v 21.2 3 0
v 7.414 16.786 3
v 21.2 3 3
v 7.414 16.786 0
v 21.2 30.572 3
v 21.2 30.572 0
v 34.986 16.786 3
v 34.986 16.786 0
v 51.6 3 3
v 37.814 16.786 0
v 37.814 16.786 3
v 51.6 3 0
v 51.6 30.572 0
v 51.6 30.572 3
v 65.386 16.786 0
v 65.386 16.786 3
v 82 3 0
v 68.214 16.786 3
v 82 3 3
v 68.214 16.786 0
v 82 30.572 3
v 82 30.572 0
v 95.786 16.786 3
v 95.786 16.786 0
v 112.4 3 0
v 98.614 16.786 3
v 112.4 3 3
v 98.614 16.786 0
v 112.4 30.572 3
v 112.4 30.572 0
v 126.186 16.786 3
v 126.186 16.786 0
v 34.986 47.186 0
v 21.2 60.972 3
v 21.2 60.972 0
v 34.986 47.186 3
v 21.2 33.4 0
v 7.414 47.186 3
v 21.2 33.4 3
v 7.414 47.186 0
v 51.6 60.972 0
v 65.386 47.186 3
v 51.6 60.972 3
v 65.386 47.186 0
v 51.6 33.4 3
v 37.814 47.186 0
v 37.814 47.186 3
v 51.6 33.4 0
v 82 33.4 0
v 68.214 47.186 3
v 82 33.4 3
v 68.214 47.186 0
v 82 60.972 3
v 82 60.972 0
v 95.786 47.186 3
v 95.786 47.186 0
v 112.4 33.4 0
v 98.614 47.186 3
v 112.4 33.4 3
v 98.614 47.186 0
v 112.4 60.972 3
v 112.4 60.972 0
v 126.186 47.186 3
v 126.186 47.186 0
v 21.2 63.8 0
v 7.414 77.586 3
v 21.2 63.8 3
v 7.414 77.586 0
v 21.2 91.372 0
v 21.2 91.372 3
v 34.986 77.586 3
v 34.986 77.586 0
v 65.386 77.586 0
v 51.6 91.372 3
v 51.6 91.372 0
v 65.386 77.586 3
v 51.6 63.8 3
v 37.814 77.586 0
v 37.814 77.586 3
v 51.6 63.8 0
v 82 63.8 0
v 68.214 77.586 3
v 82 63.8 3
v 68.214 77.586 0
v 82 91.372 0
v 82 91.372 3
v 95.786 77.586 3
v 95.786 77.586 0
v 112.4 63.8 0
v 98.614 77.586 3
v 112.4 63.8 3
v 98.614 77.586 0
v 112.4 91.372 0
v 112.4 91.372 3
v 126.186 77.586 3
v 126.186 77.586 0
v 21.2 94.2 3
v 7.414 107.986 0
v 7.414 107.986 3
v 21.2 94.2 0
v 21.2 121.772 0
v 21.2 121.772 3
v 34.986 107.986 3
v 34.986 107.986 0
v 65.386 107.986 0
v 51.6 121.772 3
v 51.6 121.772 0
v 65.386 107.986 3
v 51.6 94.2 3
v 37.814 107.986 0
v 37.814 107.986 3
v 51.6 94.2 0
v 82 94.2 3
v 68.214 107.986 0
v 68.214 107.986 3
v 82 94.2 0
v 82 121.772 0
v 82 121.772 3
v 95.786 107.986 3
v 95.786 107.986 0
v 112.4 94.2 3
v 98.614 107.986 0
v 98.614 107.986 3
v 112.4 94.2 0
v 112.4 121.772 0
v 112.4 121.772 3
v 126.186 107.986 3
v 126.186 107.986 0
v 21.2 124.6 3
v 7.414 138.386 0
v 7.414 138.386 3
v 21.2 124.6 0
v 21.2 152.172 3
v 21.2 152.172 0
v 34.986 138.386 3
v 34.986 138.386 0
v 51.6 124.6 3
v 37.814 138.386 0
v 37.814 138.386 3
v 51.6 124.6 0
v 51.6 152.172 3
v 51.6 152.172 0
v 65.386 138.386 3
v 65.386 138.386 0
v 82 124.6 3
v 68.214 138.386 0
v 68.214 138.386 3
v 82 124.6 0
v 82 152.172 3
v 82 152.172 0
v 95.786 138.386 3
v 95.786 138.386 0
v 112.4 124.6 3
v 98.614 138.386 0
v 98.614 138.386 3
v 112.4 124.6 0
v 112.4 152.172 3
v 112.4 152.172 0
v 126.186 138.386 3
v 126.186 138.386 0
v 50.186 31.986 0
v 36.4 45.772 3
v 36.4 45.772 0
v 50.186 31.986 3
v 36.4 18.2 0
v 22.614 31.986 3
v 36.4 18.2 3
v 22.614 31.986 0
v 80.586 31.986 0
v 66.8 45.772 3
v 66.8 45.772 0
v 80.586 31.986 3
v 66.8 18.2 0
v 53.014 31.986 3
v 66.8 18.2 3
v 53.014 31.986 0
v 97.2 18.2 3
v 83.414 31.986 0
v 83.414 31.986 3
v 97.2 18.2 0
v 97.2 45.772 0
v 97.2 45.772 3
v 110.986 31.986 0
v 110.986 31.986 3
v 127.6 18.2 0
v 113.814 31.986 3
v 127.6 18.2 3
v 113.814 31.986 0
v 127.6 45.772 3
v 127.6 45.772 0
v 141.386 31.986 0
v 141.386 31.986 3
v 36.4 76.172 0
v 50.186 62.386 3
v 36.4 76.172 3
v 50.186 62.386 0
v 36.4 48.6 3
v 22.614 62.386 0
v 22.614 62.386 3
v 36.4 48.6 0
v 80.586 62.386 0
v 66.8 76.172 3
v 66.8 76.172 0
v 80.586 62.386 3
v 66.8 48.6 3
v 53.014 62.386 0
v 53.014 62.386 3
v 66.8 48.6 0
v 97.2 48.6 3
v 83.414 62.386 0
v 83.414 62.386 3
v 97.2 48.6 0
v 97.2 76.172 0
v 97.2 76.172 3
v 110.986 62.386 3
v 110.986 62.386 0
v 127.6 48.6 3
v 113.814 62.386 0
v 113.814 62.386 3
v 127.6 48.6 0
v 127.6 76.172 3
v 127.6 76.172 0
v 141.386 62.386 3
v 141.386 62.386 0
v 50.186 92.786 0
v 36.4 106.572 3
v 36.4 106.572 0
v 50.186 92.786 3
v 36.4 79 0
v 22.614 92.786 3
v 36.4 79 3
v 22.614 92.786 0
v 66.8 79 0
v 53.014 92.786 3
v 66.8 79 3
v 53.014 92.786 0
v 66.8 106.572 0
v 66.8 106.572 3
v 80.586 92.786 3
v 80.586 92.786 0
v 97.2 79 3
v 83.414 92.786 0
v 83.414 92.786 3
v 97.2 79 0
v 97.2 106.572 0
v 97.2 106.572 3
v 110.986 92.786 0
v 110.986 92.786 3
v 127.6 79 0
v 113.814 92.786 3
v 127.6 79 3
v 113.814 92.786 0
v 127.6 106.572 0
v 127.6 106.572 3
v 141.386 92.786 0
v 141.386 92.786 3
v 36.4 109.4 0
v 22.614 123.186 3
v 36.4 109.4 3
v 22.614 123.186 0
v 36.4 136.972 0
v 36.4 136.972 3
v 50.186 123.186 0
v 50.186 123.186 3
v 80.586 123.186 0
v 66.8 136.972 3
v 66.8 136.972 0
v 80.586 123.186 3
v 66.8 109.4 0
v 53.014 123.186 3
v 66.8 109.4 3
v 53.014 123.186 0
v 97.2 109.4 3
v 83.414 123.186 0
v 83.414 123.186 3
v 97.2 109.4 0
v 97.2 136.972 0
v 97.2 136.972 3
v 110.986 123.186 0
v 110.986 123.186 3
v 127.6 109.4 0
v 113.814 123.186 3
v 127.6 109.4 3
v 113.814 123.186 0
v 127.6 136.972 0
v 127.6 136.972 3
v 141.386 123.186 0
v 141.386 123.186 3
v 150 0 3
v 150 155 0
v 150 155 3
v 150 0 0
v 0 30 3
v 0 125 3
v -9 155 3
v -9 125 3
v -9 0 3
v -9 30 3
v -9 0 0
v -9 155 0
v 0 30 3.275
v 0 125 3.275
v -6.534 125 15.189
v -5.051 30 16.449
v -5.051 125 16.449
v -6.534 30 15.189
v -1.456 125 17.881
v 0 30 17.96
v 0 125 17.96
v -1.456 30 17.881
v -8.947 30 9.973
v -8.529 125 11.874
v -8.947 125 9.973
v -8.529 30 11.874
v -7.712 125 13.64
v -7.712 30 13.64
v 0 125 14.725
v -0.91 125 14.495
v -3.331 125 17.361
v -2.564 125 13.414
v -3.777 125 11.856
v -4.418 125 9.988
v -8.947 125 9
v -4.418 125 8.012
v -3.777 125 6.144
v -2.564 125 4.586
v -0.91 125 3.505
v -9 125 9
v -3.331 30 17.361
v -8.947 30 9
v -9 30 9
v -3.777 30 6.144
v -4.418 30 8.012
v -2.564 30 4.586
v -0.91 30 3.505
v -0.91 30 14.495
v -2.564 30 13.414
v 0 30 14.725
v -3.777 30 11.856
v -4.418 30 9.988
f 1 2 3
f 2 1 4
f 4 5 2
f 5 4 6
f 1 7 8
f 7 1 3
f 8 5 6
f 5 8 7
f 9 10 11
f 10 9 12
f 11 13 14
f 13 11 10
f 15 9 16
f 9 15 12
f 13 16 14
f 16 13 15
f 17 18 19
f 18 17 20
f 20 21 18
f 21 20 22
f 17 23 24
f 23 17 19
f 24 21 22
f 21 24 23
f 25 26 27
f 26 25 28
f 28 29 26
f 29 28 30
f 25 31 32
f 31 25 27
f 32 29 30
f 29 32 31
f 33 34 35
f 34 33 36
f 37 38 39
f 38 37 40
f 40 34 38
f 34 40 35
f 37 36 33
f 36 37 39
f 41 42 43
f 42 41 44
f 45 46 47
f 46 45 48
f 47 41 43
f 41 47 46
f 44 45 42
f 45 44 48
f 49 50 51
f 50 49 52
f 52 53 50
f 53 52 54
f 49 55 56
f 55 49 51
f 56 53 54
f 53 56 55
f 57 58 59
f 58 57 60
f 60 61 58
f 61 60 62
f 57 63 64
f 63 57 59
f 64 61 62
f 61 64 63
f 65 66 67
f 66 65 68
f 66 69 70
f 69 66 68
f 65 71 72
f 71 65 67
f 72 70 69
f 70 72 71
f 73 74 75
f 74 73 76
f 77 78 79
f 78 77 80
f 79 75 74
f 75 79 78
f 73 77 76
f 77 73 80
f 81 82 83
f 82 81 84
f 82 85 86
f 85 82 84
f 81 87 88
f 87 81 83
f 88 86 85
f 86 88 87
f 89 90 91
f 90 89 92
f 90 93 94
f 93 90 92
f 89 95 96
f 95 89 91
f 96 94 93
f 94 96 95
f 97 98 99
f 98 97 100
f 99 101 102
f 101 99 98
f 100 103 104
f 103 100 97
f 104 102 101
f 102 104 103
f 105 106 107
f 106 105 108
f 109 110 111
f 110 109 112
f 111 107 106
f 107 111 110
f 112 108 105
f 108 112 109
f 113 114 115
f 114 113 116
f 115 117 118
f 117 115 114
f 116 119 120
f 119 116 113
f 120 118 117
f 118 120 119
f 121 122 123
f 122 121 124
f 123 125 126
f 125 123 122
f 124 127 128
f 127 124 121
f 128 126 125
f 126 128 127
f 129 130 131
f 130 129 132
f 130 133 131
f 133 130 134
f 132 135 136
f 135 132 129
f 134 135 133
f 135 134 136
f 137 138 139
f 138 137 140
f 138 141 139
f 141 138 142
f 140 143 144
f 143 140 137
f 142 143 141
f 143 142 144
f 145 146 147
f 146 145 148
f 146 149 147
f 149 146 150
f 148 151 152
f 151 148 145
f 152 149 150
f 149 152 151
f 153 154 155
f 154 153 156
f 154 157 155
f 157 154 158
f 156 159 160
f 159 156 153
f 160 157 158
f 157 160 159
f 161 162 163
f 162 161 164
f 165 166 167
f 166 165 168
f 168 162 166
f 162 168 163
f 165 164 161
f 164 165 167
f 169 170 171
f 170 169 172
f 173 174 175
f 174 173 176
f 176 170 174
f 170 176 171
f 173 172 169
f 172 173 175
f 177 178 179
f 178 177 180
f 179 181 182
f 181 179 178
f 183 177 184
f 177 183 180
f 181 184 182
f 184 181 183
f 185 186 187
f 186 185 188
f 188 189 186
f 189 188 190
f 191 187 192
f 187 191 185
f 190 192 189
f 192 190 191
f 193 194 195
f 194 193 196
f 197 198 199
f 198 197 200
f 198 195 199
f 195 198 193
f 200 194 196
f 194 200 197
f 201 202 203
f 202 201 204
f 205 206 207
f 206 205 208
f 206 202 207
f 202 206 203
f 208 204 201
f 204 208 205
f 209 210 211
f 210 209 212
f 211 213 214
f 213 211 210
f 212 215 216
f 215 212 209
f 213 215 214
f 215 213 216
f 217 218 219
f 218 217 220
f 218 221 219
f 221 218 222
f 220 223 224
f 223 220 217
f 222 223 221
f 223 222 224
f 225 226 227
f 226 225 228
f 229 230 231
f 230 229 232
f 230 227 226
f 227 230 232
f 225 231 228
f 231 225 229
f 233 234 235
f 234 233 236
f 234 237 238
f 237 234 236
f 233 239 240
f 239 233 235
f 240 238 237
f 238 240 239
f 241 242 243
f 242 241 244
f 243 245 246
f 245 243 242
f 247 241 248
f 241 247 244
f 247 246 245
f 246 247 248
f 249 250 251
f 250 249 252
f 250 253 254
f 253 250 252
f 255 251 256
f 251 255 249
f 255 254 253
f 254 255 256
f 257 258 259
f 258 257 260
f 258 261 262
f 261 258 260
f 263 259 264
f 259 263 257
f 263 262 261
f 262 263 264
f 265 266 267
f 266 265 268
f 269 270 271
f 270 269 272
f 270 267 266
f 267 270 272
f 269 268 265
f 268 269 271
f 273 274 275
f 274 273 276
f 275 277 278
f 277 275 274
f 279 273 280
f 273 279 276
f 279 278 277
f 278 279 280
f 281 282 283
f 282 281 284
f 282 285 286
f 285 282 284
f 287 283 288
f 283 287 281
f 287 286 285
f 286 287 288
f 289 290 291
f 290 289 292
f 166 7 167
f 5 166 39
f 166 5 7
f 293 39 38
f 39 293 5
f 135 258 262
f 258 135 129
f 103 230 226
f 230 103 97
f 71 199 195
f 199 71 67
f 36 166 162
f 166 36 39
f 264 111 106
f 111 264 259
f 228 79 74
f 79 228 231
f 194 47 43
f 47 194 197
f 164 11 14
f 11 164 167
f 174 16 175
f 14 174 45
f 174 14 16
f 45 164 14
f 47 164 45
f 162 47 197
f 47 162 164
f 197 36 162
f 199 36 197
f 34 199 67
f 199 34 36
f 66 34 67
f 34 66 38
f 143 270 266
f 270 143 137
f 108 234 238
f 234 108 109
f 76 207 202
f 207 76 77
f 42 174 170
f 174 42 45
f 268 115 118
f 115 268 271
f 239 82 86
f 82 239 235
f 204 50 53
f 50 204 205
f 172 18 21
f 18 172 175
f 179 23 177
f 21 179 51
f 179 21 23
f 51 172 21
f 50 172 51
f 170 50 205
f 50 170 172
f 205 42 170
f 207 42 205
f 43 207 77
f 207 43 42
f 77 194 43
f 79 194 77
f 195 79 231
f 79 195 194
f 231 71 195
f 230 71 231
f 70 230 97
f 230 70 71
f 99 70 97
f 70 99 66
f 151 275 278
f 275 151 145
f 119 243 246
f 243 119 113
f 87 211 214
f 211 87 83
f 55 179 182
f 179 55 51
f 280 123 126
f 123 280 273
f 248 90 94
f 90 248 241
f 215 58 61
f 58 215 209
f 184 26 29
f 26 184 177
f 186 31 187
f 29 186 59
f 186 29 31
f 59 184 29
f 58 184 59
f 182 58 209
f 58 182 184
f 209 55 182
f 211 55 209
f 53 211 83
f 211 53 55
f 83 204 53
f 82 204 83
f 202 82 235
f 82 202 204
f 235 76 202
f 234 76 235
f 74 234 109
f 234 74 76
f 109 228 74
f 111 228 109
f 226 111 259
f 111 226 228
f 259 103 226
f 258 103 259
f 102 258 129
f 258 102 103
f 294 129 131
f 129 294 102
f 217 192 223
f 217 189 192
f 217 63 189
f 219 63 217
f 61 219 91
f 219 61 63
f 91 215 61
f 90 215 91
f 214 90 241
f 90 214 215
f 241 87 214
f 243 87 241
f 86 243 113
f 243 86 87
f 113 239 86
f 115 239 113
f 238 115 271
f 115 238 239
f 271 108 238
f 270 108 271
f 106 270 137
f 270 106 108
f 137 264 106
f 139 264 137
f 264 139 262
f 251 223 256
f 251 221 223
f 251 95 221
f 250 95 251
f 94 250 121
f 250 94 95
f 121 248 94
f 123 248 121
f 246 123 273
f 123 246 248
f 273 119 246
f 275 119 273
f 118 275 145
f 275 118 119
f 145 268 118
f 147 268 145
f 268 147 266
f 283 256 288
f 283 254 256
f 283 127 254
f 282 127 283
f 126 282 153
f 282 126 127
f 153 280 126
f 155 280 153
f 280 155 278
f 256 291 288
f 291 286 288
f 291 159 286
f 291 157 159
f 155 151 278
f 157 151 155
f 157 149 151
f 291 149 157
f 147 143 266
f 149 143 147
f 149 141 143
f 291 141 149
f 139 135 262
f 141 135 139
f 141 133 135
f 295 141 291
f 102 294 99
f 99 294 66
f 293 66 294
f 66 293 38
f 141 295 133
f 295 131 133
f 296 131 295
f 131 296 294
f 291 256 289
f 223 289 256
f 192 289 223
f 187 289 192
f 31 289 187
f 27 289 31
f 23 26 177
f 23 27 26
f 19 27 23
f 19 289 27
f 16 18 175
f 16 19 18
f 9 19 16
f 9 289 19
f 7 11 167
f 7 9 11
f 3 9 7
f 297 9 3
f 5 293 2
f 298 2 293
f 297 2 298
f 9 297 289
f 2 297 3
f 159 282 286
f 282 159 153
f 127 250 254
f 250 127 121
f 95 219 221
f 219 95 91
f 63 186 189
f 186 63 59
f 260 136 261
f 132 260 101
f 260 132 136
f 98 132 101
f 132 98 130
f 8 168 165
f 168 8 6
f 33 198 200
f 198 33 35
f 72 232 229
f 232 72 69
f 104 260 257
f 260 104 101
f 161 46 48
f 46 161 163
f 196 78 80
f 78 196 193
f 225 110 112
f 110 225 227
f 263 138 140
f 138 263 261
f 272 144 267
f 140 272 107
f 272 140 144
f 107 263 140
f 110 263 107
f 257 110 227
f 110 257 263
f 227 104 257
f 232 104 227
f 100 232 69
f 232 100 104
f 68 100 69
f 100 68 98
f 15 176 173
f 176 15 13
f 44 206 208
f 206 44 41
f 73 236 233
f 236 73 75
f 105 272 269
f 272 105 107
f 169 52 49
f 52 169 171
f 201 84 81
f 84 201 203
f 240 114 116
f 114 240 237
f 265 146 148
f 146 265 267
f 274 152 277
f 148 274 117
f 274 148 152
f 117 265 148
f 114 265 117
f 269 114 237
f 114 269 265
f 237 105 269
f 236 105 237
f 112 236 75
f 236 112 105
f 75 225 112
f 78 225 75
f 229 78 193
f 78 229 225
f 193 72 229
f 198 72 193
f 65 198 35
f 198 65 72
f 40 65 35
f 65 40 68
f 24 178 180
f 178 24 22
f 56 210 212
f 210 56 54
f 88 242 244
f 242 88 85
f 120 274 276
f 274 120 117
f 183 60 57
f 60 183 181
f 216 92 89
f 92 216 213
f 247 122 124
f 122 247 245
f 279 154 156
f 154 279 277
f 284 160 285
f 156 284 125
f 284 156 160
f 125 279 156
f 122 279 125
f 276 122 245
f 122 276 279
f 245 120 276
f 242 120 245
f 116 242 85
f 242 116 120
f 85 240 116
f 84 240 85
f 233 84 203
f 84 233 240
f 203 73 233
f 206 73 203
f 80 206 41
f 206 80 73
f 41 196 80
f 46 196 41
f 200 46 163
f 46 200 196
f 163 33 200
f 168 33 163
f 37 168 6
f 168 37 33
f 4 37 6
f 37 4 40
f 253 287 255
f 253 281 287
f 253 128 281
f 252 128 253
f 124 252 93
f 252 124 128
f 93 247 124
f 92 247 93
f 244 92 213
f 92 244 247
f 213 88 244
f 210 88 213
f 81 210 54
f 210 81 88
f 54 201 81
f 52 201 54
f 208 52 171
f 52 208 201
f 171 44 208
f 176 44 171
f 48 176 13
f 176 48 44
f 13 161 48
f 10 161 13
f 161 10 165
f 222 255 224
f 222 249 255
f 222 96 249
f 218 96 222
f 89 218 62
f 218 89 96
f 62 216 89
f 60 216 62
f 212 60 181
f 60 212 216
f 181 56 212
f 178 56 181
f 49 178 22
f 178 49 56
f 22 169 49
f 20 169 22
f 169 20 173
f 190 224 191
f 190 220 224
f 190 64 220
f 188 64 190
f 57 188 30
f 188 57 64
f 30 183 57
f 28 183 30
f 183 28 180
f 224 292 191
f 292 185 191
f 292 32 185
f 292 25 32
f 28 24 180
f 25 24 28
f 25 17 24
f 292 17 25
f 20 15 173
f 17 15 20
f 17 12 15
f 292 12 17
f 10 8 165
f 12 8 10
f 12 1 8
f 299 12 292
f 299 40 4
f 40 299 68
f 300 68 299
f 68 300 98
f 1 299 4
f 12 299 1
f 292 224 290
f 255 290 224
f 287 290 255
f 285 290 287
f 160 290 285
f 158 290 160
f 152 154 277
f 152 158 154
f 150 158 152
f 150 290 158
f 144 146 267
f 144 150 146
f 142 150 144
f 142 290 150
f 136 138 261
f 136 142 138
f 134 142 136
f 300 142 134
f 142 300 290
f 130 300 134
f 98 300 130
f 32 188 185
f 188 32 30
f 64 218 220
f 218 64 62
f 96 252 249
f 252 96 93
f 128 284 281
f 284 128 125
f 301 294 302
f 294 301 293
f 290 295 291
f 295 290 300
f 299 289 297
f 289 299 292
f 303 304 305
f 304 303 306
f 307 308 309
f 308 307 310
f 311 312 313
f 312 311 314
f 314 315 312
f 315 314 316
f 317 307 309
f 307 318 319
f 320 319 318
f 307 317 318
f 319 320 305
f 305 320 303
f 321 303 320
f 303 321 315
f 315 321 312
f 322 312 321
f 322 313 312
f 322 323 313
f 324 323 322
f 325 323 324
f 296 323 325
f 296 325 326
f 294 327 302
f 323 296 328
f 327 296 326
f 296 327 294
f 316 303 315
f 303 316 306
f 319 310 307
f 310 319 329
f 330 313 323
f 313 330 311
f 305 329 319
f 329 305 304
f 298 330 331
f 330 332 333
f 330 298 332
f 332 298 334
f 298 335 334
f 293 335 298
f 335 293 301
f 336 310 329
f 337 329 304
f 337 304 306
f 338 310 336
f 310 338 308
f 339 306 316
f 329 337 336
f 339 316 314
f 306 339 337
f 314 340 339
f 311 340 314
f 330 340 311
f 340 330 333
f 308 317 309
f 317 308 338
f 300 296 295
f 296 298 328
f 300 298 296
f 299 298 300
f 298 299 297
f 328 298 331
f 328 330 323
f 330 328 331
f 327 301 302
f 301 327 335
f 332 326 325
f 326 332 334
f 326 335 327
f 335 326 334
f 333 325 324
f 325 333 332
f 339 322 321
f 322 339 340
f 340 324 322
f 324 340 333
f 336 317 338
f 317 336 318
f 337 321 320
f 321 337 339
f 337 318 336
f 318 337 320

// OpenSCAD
/**
** @author robert Schrenk
** @licence cc-by
**/
// Print the plate solid ("yes"), as a mesh ("no") or a solid base layer with a mesh ("mix")
mesh = "yes"; // [yes, no, mix]
// Height of wall (mm)
height = 150;
// Length of wall (mm)
length = 155;
// Thickness of wall (mm)
thickness = 3;
// Offset of clasp from front (mm)
clasp_front = 30;
// Offset of clasp from back (mm)
clasp_back = 30;
// Diameter of shaft (mm)
diameter = 12;
// Amount of holes per length (only if mesh = true or mix)
holes = 5;

base_plate();
translate([0,clasp_back,diameter/2+thickness]) {
    rotate([-90,0,0]) {
        difference(){
            union() {
                cylinder(d=diameter+2*thickness,h=length-clasp_back-clasp_front);
                translate([-3*thickness,0,0]) {
                    cube([3*thickness,(2*thickness+diameter)/2,length-clasp_back-clasp_front]);
                }
                translate([-3*thickness,2*thickness,-clasp_front])
                    cube([3*thickness,thickness,clasp_front]);
                translate([-3*thickness,2*thickness,length-2*clasp_back])
                    cube([3*thickness,thickness,clasp_back]);
            }
            translate([thickness/2,0,-1])
                cylinder(d=diameter,h=length);
            translate([0,-diameter/2-thickness,-1]) {
                cube([height,2*diameter+thickness,length]);
            }
        }
    }
}


module base_plate(){
    if (mesh == "no") {
        cube([height,length,thickness]);
    }
    if (mesh == "mix") {
        cube([height,length,0.4]);
    }
    if (mesh == "yes" || mesh == "mix") {
        mesh(thickness,holes,height,length);
    }
}

module mesh(border=2,holes=10,h,l){
    diag = (l - border) / holes; //
    piece_l = sqrt(diag*diag/2);
    difference(){
        cube([h,l,border]);
        for (a = [ 0 : diag : l-2*border]) {
            for (b = [ 0 : diag : h-2*border-diag]) {
                translate([diag/2+b+2*border,border+a,-1])
                    rotate([0,0,45])
                        cube([piece_l-2,piece_l-2,border+2]);
            }
        }
        for (a = [ 0 : diag : l-2*border-diag]) {
            for (b = [ 0 : diag : h-2*border-diag]) {
                translate([diag/2+diag/2+b+2*border,border+a+diag/2,-1])
                    rotate([0,0,45])
                        cube([piece_l-2,piece_l-2,border+2]);
            }
        }
    }
    
}
